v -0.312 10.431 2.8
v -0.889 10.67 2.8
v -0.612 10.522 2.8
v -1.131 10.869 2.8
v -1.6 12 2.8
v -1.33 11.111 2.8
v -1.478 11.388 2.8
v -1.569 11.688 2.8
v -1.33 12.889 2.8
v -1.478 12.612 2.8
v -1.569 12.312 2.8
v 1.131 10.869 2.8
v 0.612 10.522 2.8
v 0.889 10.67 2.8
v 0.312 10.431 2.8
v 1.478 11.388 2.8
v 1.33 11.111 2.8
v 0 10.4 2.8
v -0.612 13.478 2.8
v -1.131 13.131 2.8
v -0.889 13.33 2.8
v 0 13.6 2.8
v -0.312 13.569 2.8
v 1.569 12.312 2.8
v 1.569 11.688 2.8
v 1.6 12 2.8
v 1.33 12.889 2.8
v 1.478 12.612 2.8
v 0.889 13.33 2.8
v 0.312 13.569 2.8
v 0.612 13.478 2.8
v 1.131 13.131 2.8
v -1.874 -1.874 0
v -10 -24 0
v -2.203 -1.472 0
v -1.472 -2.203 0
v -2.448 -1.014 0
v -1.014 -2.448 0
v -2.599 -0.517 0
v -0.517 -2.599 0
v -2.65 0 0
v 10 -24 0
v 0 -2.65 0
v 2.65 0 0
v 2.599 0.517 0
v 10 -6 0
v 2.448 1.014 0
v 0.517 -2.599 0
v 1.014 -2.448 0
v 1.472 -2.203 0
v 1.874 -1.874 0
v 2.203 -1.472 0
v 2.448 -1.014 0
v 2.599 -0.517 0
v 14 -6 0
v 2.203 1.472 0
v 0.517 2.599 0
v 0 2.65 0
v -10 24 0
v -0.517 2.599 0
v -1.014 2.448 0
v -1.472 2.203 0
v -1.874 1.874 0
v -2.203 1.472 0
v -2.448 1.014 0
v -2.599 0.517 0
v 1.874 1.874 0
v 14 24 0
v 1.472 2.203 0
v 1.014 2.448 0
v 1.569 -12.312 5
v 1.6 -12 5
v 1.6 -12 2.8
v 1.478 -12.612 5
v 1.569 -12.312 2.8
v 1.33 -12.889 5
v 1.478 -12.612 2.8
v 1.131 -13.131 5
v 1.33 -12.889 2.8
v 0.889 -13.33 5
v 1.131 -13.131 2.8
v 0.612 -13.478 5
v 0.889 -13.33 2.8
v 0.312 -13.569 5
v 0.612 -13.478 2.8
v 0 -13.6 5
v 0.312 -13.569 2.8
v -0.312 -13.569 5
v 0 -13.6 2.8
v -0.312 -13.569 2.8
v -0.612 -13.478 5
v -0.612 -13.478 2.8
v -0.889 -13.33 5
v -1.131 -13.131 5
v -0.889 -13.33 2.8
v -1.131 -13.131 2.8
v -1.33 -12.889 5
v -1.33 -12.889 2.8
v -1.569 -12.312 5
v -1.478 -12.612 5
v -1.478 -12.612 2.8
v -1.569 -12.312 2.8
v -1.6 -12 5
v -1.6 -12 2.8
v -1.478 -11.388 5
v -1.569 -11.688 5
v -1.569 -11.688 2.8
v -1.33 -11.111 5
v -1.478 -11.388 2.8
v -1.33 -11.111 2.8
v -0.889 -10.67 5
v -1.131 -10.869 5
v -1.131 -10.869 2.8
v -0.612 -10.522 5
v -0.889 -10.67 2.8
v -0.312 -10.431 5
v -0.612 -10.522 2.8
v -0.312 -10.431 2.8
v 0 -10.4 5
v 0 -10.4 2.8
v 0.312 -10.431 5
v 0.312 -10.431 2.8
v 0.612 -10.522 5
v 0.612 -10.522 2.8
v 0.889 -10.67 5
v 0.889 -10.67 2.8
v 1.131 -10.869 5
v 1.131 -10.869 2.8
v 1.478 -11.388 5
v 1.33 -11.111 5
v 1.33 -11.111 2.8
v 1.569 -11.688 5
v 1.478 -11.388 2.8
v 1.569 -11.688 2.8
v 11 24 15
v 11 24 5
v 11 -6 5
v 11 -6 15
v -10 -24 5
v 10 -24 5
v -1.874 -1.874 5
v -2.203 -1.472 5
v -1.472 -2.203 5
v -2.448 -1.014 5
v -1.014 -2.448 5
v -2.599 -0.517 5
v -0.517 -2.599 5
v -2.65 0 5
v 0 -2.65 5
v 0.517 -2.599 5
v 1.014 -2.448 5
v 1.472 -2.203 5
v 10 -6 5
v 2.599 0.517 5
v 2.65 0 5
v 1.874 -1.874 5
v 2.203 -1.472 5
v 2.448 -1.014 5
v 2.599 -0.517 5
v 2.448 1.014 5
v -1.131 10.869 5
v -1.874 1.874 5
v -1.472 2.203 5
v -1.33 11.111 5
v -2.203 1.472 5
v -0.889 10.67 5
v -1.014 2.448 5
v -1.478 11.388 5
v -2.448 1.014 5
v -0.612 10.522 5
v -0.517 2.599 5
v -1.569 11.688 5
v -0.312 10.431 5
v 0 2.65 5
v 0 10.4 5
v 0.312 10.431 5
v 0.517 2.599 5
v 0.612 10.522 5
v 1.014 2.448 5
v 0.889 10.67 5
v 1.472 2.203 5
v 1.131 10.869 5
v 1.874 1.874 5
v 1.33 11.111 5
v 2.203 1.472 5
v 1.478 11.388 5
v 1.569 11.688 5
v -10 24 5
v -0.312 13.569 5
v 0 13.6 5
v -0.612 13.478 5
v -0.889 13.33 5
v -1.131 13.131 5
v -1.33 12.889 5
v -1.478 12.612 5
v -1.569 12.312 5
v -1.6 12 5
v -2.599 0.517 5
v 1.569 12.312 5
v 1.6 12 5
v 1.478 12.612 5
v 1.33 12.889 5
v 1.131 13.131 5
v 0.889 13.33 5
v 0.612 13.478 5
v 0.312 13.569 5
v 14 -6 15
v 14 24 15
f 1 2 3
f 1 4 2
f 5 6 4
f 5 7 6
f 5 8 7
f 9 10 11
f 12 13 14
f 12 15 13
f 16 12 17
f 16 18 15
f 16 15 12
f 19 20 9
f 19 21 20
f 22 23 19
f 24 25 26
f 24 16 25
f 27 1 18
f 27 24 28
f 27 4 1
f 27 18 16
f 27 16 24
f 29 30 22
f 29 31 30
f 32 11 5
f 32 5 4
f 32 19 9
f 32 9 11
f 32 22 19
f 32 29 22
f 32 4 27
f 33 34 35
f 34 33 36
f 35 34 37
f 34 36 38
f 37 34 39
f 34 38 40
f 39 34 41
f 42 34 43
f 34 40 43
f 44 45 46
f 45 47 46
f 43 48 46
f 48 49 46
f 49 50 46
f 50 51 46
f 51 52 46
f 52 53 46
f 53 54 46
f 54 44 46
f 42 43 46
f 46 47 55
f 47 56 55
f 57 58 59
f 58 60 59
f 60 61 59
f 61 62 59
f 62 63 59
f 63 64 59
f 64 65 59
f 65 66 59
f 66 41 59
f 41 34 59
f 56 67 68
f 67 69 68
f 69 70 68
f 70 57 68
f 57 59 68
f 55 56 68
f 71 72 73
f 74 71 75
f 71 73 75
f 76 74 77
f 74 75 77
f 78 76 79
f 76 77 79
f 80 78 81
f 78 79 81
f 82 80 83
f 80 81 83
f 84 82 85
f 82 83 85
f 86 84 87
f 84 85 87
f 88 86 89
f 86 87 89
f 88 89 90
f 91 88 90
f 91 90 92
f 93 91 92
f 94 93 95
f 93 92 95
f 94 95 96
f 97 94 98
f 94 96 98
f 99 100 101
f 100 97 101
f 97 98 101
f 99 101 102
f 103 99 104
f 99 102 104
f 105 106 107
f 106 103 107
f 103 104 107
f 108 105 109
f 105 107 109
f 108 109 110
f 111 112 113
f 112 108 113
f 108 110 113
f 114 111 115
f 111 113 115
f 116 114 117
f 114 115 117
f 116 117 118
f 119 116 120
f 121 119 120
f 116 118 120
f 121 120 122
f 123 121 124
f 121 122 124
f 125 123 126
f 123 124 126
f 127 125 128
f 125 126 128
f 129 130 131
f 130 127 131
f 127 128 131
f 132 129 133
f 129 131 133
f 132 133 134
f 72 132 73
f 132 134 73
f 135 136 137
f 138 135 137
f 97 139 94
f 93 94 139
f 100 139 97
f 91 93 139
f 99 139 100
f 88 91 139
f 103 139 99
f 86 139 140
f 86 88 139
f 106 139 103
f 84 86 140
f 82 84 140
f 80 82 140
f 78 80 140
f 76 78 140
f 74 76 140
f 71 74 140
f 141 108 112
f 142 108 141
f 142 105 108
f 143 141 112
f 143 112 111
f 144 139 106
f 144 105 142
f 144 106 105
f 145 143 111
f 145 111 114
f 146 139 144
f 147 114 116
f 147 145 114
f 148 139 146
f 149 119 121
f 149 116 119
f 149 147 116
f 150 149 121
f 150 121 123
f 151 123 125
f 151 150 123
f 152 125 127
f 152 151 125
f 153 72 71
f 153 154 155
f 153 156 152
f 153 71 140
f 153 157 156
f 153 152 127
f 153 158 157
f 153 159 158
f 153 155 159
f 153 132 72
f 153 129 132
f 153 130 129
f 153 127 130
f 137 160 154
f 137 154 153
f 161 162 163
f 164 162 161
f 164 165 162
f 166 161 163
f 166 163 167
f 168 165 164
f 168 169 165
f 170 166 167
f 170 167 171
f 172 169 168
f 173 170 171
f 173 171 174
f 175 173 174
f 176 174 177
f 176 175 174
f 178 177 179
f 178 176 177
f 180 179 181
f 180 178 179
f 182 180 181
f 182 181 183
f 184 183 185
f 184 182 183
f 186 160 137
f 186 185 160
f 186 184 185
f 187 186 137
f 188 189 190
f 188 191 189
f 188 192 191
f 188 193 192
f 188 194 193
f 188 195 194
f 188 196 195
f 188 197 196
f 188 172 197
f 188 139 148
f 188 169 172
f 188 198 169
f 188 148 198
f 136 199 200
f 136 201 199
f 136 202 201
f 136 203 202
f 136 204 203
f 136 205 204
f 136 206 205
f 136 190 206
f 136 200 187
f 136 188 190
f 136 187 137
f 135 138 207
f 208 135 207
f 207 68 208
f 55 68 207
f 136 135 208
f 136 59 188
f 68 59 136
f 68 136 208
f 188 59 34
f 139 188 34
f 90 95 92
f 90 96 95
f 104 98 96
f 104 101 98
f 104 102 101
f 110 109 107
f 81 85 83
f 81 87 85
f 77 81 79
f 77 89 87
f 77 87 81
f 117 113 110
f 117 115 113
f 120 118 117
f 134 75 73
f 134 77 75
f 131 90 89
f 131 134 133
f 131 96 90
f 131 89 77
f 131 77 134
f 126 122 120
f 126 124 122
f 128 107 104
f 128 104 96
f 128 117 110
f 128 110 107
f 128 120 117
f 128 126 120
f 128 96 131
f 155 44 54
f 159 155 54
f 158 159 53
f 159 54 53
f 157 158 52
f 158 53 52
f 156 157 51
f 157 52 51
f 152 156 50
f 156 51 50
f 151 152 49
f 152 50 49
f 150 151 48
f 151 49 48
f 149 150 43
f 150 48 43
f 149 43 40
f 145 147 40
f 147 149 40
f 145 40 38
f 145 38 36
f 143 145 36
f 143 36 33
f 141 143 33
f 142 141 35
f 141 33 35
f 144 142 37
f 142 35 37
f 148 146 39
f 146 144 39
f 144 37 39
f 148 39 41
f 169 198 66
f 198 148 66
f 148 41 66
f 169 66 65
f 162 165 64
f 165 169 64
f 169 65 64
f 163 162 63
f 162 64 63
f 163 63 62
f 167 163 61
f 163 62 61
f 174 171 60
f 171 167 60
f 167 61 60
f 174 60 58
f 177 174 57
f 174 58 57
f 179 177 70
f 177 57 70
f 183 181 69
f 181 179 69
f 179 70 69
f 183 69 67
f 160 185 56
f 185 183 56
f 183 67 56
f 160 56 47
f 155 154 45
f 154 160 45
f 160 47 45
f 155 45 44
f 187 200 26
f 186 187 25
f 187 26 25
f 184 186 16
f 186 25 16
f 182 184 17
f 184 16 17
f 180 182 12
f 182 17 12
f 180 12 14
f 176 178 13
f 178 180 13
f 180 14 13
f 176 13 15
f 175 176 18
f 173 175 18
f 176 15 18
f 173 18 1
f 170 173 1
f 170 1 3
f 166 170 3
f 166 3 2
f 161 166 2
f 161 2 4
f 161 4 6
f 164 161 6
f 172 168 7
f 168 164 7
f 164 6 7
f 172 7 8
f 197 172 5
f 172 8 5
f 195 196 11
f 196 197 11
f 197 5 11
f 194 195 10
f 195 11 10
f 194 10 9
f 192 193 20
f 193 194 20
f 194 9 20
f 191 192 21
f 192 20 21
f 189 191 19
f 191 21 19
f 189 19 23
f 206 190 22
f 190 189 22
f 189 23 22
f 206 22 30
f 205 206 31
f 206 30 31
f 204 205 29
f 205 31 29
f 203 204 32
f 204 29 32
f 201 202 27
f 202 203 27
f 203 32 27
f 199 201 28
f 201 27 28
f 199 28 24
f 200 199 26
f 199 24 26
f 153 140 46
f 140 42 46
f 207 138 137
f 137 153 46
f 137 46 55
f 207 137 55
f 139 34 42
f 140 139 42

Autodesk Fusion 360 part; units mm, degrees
sketch "스케치1" plane through (0, 0, 0) normal (0, 0, 1) x (1, 0, 0)
  line L0 (10, 24) -> (-10, 24)
  line L1 (-10, 24) -> (-10, -24)
  line L2 (-10, -24) -> (10, -24)
  line L3 (10, -24) -> (10, 24)
  line L4 (10, 24) -> (-10, -24) construction
  line L5 (-10, 24) -> (10, -24) construction
  circle A0 centre (0, 0) radius 2.65
  line L6 (0, 0) -> (0, 12)
  circle A1 centre (0, 12) radius 1.6
  line L7 (0, 0) -> (0, -12)
  circle A2 centre (0, -12) radius 1.6
  line L8 (10, 24) -> (11, 24)
  line L9 (11, 24) -> (11, -24)
  line L10 (11, -24) -> (10, -24)
  line L11 (10, -24) -> (10, 24)
  line L12 (11, 24) -> (14, 24)
  line L13 (14, 24) -> (14, -24)
  line L14 (14, -24) -> (11, -24)
  line L15 (11, -24) -> (11, 24)
  line L16 (10, -6) -> (14, -6)
  dimension "d1" = 20
  dimension "d2" = 48
  dimension "d3" = 5.3
  dimension "d4" = 12
  dimension "d5" = 3.2
  dimension "d6" = 12
  dimension "d7" = 3.2
  dimension "d12" = 3
extrude "돌출1" add sketch "스케치1" along normal blind 5 contours L0 L1 L2 L3 L11 | L3 L8 L9 L11 L15 L16
extrude "돌출2" add sketch "스케치1" along normal blind 2.8 contours A2 | A1
extrude "돌출3" add sketch "스케치1" along normal blind 15 contours L9 L12 L13 L15 L16
